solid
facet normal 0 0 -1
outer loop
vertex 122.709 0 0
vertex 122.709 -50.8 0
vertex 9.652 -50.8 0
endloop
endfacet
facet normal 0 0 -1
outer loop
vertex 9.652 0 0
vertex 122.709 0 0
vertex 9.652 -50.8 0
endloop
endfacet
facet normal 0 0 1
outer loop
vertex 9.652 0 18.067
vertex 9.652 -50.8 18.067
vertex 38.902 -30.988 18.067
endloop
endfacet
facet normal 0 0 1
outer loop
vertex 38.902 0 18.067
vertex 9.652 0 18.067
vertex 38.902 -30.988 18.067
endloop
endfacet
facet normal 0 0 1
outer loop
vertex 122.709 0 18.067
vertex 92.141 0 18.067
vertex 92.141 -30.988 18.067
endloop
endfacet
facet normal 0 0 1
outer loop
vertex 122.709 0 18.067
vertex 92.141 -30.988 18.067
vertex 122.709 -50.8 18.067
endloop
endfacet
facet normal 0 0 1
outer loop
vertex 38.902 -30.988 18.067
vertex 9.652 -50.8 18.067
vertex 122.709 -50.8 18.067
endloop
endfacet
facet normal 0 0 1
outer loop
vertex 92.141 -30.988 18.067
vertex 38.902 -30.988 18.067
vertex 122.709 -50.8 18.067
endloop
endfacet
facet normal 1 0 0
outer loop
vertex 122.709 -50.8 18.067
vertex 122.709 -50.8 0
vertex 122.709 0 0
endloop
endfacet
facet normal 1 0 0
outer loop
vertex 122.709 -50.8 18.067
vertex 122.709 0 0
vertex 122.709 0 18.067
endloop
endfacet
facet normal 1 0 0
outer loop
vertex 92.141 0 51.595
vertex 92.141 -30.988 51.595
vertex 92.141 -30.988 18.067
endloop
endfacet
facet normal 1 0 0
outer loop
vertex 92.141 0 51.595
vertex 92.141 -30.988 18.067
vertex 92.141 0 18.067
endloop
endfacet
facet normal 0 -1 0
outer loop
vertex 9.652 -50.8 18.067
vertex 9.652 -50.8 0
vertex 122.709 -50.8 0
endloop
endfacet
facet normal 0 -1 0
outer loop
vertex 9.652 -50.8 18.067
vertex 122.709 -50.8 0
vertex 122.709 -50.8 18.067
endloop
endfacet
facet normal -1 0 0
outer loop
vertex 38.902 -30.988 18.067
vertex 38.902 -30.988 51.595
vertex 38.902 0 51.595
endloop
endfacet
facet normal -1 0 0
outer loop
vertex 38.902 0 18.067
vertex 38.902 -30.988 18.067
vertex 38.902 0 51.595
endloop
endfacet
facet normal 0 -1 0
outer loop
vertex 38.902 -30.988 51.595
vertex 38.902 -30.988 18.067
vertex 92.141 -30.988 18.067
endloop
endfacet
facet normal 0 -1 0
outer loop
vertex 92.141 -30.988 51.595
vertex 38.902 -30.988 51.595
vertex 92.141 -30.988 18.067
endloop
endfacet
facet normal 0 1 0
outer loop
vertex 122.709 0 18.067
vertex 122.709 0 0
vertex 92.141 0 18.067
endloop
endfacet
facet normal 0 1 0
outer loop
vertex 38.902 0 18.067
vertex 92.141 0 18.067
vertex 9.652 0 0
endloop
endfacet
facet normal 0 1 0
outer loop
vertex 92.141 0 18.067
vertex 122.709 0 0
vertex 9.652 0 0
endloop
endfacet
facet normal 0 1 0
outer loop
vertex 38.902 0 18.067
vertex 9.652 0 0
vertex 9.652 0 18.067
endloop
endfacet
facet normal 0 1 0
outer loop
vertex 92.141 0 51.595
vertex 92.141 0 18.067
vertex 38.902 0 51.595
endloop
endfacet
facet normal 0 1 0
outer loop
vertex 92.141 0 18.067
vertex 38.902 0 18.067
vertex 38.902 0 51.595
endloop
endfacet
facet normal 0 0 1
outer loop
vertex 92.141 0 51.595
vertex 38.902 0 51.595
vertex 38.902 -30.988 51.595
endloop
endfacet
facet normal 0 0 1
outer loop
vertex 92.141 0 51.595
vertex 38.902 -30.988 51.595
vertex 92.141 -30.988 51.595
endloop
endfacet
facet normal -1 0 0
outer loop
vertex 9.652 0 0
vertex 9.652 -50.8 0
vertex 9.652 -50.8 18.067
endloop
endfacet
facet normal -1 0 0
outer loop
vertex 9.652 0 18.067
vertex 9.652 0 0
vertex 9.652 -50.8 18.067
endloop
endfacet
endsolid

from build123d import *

# Parameters (mm, degrees)
F0_W     = 127.5347471237
F0_H     = 50.8334226906
F1_DEPTH = 50.8
F2_DEPTH = 32.766
F3_W     = 53.2384
F3_H     = 30.988
F4_DEPTH = 33.528
F5_DEPTH = 4.826
F6_DEPTH = 7.366
F7_DEPTH = 8.89
F8_DEPTH = 9.652
F9_DEPTH = 5.334


with BuildPart() as f1:
    # F0 (on Front) → F1 (new body)
    with BuildSketch(Plane.XZ):
        with Locations((63.7673735619, 25.4167113453)):
            Rectangle(F0_W, F0_H)
    extrude(amount=F1_DEPTH)

    # F2 (cut): a face of the model
    f2_faces = [f1.faces().sort_by_distance(p)[0] for p in [
        (63.7673735619, -25.4, 50.8334226906),
    ]]
    extrude(f2_faces, amount=-F2_DEPTH, mode=Mode.SUBTRACT)

    # F3 (on face) → F4 (join)
    with BuildSketch(Plane.XY.offset(18.0674226906)):
        with Locations((65.5213113515, -15.494)):
            Rectangle(F3_W, F3_H)
    extrude(amount=F4_DEPTH)

    # F5 (cut): a face of the model
    f5_faces = [f1.faces().sort_by_distance(p)[0] for p in [
        (127.5347471237, -25.4, 9.0337113453),
    ]]
    extrude(f5_faces, amount=-F5_DEPTH, mode=Mode.SUBTRACT)

    # F6 (add): a face of the model
    f6_faces = [f1.faces().sort_by_distance(p)[0] for p in [
        (0, -25.4, 9.0337113453),
    ]]
    extrude(f6_faces, amount=-F6_DEPTH)

    # F7 (add): a face of the model
    f7_faces = [f1.faces().sort_by_distance(p)[0] for p in [
        (0, -25.4, 9.0337113453),
    ]]
    extrude(f7_faces, amount=-F7_DEPTH)

    # F8 (cut): a face of the model
    f8_faces = [f1.faces().sort_by_distance(p)[0] for p in [
        (0, -25.4, 9.0337113453),
    ]]
    extrude(f8_faces, amount=-F8_DEPTH, mode=Mode.SUBTRACT)

    # F9 (add): a face of the model
    f9_faces = [f1.faces().sort_by_distance(p)[0] for p in [
        (66.1803735619, -50.8, 9.0337113453),
    ]]
    extrude(f9_faces, amount=-F9_DEPTH)


solid = f1.part
